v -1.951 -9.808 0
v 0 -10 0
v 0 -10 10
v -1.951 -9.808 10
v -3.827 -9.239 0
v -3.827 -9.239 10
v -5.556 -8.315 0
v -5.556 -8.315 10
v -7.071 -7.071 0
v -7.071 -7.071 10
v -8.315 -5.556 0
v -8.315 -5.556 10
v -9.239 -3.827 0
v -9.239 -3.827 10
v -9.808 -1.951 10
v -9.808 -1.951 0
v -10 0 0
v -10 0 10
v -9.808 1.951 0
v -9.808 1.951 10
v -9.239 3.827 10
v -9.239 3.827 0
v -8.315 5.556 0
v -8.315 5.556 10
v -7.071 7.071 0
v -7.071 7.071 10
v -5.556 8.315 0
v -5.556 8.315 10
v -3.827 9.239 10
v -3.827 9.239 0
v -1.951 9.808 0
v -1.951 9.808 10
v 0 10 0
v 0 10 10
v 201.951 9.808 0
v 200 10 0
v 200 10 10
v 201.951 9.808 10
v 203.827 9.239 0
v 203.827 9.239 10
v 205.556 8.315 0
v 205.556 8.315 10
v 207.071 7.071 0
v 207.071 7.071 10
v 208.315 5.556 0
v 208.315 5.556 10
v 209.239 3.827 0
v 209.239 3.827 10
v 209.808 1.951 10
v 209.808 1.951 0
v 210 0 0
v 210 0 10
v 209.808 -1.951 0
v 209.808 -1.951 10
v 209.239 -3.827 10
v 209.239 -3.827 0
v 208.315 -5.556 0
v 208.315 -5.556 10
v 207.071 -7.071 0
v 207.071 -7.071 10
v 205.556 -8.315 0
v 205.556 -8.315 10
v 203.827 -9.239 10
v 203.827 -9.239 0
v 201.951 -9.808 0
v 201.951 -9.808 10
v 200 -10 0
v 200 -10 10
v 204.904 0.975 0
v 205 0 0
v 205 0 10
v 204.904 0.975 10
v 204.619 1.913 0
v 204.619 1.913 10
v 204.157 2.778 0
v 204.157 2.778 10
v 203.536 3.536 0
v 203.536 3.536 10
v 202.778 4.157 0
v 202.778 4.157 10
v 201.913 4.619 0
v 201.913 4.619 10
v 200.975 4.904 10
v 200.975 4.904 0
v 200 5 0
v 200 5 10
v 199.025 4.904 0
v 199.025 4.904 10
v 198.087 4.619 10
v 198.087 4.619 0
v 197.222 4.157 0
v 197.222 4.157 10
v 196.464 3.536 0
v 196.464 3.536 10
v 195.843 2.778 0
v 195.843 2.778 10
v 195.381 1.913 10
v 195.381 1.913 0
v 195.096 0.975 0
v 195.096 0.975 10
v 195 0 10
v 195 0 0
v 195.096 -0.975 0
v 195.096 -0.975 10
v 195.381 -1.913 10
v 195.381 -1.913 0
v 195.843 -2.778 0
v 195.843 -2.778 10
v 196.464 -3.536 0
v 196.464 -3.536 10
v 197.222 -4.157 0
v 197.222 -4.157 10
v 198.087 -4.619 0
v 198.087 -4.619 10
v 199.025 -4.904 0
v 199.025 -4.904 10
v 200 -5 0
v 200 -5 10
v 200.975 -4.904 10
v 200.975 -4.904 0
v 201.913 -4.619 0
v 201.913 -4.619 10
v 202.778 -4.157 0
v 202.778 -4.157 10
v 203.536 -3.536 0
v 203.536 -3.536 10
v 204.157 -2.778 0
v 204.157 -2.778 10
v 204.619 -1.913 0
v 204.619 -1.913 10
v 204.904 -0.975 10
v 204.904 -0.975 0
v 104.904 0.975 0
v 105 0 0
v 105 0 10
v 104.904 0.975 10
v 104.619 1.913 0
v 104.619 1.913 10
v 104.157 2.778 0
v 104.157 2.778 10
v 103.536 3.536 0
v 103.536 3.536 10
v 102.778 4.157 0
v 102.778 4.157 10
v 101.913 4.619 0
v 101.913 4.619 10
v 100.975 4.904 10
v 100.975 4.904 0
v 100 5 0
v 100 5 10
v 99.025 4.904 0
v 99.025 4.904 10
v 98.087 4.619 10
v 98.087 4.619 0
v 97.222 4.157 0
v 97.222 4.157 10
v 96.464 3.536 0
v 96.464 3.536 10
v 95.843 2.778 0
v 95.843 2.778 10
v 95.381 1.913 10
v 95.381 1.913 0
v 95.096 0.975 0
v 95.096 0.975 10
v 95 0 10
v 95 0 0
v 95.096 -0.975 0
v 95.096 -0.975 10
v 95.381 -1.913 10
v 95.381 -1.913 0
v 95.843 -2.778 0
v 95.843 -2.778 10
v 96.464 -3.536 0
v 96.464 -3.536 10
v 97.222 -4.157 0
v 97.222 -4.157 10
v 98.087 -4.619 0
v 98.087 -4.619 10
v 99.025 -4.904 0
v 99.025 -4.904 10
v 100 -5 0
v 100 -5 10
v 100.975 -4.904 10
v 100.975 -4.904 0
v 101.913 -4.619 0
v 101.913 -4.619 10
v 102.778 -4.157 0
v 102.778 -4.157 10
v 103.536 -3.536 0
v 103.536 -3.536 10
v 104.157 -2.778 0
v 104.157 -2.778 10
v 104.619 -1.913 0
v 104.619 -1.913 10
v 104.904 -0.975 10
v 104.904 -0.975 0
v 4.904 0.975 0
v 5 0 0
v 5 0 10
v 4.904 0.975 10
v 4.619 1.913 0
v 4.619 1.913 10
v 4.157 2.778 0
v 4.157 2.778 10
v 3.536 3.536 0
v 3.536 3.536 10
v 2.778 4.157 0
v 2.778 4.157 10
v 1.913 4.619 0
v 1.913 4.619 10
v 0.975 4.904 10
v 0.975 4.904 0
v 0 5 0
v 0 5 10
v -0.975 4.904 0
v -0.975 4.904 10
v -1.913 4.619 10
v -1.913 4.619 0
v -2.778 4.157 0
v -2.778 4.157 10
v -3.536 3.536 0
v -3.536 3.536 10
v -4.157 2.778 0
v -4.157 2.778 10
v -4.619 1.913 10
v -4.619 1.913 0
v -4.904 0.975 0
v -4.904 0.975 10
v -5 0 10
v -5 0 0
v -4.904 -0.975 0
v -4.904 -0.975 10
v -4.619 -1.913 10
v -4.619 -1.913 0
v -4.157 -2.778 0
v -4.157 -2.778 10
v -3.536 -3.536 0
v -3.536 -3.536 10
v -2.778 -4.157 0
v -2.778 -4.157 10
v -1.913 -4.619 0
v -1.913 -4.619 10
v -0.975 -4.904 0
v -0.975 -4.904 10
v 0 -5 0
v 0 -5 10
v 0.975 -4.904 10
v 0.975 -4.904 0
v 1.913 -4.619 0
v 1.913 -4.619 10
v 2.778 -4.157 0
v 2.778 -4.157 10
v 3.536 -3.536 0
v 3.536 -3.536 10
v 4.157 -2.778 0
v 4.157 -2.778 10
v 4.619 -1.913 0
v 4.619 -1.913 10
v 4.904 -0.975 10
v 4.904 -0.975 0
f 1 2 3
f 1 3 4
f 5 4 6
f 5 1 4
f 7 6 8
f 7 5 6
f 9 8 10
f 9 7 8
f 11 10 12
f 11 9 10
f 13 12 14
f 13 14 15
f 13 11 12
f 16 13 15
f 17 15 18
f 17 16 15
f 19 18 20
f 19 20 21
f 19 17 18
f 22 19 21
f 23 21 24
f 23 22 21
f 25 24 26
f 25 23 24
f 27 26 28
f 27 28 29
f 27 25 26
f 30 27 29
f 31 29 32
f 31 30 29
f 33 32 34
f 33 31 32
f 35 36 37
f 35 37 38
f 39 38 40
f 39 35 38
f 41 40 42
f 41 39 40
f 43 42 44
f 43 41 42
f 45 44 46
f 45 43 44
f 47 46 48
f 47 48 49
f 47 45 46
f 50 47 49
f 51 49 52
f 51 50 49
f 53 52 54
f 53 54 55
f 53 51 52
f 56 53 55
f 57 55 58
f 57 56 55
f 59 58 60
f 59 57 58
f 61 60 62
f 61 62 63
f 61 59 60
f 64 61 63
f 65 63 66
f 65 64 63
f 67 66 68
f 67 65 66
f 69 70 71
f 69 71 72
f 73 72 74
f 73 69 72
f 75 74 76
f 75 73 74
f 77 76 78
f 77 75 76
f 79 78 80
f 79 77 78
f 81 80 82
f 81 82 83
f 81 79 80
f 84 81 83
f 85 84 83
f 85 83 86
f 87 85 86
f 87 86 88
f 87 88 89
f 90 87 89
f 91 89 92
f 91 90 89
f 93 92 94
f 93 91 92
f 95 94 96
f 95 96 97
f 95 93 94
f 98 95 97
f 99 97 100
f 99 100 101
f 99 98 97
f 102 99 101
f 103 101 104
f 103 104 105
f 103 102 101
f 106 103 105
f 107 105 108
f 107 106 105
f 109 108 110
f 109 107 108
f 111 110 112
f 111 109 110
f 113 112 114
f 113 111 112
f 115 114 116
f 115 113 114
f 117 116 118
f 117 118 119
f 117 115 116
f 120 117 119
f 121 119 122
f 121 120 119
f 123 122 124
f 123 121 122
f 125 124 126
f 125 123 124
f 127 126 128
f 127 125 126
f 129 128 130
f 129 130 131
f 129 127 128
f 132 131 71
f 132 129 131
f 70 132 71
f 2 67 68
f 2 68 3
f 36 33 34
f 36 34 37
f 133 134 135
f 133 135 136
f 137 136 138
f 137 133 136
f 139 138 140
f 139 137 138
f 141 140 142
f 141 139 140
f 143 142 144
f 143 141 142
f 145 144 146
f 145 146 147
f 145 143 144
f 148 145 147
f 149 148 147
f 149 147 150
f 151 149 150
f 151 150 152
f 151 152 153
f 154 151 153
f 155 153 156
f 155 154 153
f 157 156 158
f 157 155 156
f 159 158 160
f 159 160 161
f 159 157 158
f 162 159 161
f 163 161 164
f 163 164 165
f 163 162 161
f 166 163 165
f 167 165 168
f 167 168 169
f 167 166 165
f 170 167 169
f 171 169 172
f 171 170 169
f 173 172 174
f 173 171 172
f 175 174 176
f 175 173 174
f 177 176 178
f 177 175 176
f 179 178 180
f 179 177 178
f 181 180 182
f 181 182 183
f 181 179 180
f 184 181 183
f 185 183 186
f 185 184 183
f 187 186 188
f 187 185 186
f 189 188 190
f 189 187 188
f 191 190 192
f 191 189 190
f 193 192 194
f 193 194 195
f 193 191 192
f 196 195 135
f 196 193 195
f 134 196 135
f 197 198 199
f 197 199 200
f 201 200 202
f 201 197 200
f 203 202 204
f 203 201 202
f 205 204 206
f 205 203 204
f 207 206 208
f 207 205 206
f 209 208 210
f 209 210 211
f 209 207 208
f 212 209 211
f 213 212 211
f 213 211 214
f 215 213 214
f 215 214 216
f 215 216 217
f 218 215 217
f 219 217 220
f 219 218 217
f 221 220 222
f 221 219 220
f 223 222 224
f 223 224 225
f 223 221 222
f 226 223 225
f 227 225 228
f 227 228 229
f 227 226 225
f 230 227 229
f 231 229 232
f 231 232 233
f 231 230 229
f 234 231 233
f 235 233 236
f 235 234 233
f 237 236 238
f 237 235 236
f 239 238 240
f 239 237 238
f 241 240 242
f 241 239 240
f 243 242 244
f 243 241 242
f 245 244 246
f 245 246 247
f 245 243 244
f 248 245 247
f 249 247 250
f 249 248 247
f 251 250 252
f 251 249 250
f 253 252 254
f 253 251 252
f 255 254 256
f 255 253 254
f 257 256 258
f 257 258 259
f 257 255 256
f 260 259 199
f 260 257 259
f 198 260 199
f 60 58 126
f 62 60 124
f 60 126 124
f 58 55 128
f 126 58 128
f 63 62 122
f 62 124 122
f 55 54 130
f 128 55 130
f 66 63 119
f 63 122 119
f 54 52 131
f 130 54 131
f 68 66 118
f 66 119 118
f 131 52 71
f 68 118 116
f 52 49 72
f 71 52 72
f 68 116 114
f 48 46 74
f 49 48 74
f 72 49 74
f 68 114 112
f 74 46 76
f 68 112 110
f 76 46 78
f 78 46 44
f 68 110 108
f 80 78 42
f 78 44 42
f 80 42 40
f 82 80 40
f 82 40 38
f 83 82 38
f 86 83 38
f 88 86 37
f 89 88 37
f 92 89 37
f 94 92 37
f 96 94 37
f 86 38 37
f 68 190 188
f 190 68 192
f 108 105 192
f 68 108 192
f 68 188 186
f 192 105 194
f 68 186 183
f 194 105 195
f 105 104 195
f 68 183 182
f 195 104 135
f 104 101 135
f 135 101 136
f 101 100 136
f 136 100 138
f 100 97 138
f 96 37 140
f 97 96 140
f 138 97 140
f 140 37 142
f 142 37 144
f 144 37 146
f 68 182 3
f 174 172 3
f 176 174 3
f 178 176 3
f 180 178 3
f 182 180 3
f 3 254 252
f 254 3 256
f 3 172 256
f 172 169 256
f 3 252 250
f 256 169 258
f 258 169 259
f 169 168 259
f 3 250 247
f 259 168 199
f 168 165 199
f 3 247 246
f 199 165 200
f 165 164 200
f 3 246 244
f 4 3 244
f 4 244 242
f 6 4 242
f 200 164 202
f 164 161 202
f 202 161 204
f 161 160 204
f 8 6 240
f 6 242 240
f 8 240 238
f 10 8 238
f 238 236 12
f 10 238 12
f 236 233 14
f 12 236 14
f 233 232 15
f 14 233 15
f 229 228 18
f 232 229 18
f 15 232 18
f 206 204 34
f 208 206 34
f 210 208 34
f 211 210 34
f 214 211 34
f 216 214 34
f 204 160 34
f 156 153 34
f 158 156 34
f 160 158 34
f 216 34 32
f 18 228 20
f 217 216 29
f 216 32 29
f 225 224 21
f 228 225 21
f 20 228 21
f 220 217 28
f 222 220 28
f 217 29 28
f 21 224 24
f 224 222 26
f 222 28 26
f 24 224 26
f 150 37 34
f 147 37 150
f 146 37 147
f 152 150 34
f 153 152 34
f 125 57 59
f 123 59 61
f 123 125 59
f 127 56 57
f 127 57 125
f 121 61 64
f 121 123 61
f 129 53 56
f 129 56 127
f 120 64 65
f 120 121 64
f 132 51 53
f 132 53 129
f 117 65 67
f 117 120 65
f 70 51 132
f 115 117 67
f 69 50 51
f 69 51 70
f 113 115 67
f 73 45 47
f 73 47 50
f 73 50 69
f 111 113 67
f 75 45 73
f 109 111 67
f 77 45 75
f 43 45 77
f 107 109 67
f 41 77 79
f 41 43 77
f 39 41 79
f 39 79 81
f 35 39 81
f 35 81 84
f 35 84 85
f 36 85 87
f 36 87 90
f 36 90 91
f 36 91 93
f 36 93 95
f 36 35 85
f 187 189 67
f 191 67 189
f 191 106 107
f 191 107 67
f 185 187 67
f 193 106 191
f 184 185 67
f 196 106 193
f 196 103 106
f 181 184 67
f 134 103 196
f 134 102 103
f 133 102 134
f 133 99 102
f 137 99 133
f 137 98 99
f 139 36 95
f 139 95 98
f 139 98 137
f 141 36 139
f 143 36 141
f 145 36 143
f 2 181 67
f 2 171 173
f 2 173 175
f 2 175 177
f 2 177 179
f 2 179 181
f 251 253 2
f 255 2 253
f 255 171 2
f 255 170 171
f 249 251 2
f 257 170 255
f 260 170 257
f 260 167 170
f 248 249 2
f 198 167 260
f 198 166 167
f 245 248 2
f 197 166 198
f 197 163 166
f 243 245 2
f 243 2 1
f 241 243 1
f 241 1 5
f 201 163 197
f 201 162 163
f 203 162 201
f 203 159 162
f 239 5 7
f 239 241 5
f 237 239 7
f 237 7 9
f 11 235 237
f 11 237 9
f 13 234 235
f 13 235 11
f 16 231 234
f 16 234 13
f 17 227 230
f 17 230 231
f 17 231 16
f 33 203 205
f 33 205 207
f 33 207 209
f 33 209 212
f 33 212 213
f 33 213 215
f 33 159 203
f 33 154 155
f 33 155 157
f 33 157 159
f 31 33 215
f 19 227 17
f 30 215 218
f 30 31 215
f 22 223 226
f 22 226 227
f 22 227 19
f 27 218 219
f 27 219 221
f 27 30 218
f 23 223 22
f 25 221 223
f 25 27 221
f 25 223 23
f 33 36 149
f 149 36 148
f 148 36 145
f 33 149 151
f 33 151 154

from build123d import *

# Parameters (mm, degrees)
SKETCH_2_R      = 5
EXTRUDE_1_DEPTH = 10


with BuildPart() as part:
    # 草图2 → 凸台-拉伸1 (new body)
    with BuildSketch(Plane.XY):
        with BuildLine():
            Line((0, 10), (200, 10))
            ThreePointArc((200, 10), (210, 0), (200, -10))
            Line((200, -10), (0, -10))
            ThreePointArc((0, -10), (-10, 0), (0, 10))
        make_face()
        Circle(SKETCH_2_R, mode=Mode.SUBTRACT)
        with Locations((200, 0)):
            Circle(SKETCH_2_R, mode=Mode.SUBTRACT)
        with Locations((100, 0)):
            Circle(SKETCH_2_R, mode=Mode.SUBTRACT)
    extrude(amount=EXTRUDE_1_DEPTH)


solid = part.part
